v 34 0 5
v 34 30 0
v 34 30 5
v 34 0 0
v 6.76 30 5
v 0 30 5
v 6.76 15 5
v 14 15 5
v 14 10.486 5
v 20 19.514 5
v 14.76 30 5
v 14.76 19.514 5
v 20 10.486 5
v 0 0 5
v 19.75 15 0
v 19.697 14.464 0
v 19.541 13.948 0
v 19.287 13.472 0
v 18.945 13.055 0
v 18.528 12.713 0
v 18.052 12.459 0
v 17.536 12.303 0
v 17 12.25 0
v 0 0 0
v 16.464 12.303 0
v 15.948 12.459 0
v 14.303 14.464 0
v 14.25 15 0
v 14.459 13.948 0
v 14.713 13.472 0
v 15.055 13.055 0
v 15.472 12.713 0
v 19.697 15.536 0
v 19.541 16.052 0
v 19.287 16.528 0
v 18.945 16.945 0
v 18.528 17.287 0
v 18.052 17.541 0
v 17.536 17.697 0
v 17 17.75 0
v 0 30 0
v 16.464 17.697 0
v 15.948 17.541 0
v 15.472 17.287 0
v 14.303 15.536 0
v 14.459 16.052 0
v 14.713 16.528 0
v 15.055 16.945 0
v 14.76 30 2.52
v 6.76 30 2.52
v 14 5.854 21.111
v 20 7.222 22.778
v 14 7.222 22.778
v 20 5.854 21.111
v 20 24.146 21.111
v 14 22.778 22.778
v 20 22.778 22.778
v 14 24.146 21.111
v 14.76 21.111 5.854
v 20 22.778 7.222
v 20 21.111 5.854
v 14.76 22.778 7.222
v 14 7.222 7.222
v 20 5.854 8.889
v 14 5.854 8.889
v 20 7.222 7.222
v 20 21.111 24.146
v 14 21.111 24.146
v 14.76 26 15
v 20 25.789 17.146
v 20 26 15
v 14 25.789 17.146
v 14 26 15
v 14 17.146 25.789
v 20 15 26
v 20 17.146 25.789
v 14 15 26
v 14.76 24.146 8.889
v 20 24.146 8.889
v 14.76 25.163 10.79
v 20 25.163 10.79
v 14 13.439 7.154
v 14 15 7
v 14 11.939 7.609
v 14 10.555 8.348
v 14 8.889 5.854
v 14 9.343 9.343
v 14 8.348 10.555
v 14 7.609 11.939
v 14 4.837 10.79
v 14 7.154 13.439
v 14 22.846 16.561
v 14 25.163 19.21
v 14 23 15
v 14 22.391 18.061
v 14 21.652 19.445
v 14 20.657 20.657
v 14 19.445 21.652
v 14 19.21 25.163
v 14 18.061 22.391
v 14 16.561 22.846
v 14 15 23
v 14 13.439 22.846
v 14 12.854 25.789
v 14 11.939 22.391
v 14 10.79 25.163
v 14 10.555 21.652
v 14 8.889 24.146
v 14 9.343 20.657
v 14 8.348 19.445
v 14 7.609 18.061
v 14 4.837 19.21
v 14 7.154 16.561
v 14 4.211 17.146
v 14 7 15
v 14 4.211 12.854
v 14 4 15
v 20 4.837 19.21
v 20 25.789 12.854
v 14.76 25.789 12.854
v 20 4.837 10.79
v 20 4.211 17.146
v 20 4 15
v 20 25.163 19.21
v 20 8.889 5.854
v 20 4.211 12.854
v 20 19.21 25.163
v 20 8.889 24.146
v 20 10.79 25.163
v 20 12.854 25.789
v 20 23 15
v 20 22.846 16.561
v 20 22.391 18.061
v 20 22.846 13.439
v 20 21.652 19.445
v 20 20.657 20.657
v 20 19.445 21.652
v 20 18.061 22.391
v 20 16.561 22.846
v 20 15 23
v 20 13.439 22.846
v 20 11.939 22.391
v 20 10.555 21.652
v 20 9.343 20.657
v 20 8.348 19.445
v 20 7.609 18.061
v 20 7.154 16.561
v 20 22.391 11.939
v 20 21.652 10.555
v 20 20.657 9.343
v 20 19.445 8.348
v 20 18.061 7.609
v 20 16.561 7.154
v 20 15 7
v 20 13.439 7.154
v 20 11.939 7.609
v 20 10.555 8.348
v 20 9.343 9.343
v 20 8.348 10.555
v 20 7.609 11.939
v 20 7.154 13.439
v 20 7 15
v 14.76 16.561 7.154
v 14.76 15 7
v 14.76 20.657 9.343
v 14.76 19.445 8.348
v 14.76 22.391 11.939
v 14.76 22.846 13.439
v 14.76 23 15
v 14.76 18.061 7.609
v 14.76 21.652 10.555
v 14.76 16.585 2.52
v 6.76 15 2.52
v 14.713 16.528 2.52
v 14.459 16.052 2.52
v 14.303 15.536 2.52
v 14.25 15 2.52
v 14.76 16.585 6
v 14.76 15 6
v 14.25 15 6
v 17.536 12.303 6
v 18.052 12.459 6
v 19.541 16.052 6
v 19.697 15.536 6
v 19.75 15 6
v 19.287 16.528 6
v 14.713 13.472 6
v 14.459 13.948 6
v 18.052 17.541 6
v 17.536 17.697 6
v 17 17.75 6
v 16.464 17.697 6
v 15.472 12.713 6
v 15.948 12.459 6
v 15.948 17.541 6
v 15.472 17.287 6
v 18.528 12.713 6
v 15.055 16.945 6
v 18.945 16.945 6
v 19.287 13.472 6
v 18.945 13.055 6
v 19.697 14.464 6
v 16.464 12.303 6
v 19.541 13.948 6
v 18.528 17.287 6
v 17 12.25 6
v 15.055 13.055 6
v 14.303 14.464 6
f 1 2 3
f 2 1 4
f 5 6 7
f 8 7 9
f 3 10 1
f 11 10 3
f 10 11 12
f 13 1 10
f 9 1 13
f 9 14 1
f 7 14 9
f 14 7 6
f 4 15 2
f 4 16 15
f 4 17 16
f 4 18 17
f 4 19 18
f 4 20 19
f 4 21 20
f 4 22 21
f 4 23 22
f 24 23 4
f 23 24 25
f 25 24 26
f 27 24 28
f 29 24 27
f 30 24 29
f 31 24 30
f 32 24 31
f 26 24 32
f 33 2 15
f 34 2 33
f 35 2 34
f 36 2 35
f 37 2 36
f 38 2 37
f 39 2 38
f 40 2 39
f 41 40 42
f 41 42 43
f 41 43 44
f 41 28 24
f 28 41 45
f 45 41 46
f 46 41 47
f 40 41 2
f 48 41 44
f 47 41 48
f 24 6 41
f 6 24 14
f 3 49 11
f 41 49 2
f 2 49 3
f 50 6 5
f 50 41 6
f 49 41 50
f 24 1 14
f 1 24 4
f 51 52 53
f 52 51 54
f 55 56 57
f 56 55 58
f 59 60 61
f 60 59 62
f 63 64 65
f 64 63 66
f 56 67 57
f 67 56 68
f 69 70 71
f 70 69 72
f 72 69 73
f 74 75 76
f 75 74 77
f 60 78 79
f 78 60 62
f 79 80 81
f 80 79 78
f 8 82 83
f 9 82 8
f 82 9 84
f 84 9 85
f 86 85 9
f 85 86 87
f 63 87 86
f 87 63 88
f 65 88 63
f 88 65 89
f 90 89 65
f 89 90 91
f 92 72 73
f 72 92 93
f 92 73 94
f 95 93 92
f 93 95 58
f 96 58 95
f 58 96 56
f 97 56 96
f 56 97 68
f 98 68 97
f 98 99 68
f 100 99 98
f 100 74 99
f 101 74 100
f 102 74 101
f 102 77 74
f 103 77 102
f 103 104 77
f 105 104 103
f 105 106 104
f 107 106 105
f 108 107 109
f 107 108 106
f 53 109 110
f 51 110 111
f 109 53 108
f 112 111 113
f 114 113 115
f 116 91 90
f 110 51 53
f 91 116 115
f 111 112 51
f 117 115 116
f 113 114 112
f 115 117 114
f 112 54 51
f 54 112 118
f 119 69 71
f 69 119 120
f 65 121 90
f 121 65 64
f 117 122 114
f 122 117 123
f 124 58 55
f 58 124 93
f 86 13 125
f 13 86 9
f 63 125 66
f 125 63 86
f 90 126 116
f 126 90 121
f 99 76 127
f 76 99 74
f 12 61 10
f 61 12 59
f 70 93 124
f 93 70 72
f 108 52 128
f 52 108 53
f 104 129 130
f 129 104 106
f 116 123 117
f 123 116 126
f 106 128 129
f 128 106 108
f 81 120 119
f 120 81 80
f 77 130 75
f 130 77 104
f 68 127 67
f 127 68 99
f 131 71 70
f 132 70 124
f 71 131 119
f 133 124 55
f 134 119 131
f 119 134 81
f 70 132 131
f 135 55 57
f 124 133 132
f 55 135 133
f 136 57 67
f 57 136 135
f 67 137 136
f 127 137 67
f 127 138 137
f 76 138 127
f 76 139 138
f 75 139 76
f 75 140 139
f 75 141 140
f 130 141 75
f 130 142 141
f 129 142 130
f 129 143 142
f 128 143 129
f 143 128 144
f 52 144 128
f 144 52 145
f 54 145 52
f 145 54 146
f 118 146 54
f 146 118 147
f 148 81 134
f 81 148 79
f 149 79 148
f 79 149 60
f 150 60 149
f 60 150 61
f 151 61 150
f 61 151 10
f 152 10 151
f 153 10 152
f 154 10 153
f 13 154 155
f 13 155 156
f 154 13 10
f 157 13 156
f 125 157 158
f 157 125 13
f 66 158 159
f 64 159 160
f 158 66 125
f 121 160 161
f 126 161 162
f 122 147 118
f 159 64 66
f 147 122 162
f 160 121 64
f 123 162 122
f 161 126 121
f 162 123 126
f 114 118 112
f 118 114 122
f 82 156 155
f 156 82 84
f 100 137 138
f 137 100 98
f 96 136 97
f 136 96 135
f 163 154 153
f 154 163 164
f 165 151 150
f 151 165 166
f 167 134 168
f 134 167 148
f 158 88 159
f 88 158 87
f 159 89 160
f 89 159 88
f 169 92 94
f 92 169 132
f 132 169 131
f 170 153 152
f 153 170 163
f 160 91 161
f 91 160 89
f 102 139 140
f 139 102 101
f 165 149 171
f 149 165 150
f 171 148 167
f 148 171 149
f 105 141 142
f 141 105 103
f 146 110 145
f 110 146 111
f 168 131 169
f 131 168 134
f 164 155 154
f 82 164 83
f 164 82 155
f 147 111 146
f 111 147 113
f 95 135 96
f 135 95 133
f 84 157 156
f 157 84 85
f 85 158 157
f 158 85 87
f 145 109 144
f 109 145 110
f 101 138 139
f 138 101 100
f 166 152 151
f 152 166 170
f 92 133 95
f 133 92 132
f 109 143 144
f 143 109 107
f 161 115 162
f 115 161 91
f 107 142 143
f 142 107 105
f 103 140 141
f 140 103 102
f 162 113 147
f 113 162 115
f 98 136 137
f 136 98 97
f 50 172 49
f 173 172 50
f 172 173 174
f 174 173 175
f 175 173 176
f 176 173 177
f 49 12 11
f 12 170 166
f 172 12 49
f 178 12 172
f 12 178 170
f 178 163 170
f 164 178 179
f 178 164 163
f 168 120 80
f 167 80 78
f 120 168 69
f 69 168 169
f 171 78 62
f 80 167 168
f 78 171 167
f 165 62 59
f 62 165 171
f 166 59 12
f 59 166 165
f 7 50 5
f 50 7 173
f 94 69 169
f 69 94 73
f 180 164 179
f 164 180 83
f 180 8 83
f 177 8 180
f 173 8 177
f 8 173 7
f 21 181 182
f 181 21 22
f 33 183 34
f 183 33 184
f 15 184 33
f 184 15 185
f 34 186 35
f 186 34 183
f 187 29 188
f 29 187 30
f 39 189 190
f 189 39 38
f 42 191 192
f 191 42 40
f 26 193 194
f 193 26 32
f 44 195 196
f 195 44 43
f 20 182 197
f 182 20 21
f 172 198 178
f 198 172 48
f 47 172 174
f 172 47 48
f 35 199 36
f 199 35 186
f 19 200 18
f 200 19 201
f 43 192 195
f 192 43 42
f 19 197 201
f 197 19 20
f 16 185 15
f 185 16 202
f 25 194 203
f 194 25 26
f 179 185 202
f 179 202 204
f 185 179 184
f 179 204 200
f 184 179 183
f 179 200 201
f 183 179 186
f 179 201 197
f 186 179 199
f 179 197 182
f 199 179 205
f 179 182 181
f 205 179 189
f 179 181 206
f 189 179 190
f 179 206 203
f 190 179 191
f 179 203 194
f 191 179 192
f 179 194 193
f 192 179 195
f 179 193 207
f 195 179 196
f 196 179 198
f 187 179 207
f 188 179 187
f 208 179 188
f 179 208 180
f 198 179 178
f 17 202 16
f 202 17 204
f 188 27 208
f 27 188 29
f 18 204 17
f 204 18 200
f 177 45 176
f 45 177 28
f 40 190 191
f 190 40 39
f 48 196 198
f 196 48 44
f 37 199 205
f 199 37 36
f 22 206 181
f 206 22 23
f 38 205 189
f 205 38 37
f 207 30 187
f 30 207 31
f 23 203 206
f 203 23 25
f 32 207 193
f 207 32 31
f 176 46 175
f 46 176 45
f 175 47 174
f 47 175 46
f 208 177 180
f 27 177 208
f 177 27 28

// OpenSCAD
$fn = 32;

// ----------------------------------------------------------------------
// Cable clip: cable 16 mm, clamp 22 mm, base 34 mm
// ----------------------------------------------------------------------

// --- parameters (mm) ---
plate_x = 34;             // base length, X
plate_y = 30;             // base width, Y
plate_t = 5;              // base thickness
wire_seat_d = 22;         // clamp outside diameter
clip_t = 3;               // clamp wall
cable_d = 16;             // cable opening
ring_w = 6;               // clamp width along the cable
screw_d = 5.5;            // screw clearance
throat = 12.48;           // snap throat width
sink = 1;                 // overlap of the clamp into the base

module base() {
  cube([plate_x, plate_y, plate_t]);
}

module clamp() {
  translate([plate_x / 2, plate_y / 2, plate_t + wire_seat_d / 2 - sink]) rotate([0, 90, 0])
    cylinder(h = ring_w, d = wire_seat_d, center = true);
}

difference() {
  union() {
    base();
    clamp();
  }
  translate([plate_x / 2, plate_y / 2, plate_t + wire_seat_d / 2 - sink]) rotate([0, 90, 0]) translate([0, 0, -ring_w / 2 - 1]) cylinder(h = ring_w + 2, d = cable_d);
  /* snap throat: the opening is narrower than the cable */
  translate([plate_x / 2 - throat / 2, plate_y / 2, plate_t + wire_seat_d / 2 - sink]) rotate([0, 90, 0]) translate([0, 0, -ring_w / 2 - 1]) cube([throat, wire_seat_d + 2, ring_w + 2]);
  translate([17, plate_y / 2, -1]) cylinder(h = plate_t + 2, d = screw_d);
}
